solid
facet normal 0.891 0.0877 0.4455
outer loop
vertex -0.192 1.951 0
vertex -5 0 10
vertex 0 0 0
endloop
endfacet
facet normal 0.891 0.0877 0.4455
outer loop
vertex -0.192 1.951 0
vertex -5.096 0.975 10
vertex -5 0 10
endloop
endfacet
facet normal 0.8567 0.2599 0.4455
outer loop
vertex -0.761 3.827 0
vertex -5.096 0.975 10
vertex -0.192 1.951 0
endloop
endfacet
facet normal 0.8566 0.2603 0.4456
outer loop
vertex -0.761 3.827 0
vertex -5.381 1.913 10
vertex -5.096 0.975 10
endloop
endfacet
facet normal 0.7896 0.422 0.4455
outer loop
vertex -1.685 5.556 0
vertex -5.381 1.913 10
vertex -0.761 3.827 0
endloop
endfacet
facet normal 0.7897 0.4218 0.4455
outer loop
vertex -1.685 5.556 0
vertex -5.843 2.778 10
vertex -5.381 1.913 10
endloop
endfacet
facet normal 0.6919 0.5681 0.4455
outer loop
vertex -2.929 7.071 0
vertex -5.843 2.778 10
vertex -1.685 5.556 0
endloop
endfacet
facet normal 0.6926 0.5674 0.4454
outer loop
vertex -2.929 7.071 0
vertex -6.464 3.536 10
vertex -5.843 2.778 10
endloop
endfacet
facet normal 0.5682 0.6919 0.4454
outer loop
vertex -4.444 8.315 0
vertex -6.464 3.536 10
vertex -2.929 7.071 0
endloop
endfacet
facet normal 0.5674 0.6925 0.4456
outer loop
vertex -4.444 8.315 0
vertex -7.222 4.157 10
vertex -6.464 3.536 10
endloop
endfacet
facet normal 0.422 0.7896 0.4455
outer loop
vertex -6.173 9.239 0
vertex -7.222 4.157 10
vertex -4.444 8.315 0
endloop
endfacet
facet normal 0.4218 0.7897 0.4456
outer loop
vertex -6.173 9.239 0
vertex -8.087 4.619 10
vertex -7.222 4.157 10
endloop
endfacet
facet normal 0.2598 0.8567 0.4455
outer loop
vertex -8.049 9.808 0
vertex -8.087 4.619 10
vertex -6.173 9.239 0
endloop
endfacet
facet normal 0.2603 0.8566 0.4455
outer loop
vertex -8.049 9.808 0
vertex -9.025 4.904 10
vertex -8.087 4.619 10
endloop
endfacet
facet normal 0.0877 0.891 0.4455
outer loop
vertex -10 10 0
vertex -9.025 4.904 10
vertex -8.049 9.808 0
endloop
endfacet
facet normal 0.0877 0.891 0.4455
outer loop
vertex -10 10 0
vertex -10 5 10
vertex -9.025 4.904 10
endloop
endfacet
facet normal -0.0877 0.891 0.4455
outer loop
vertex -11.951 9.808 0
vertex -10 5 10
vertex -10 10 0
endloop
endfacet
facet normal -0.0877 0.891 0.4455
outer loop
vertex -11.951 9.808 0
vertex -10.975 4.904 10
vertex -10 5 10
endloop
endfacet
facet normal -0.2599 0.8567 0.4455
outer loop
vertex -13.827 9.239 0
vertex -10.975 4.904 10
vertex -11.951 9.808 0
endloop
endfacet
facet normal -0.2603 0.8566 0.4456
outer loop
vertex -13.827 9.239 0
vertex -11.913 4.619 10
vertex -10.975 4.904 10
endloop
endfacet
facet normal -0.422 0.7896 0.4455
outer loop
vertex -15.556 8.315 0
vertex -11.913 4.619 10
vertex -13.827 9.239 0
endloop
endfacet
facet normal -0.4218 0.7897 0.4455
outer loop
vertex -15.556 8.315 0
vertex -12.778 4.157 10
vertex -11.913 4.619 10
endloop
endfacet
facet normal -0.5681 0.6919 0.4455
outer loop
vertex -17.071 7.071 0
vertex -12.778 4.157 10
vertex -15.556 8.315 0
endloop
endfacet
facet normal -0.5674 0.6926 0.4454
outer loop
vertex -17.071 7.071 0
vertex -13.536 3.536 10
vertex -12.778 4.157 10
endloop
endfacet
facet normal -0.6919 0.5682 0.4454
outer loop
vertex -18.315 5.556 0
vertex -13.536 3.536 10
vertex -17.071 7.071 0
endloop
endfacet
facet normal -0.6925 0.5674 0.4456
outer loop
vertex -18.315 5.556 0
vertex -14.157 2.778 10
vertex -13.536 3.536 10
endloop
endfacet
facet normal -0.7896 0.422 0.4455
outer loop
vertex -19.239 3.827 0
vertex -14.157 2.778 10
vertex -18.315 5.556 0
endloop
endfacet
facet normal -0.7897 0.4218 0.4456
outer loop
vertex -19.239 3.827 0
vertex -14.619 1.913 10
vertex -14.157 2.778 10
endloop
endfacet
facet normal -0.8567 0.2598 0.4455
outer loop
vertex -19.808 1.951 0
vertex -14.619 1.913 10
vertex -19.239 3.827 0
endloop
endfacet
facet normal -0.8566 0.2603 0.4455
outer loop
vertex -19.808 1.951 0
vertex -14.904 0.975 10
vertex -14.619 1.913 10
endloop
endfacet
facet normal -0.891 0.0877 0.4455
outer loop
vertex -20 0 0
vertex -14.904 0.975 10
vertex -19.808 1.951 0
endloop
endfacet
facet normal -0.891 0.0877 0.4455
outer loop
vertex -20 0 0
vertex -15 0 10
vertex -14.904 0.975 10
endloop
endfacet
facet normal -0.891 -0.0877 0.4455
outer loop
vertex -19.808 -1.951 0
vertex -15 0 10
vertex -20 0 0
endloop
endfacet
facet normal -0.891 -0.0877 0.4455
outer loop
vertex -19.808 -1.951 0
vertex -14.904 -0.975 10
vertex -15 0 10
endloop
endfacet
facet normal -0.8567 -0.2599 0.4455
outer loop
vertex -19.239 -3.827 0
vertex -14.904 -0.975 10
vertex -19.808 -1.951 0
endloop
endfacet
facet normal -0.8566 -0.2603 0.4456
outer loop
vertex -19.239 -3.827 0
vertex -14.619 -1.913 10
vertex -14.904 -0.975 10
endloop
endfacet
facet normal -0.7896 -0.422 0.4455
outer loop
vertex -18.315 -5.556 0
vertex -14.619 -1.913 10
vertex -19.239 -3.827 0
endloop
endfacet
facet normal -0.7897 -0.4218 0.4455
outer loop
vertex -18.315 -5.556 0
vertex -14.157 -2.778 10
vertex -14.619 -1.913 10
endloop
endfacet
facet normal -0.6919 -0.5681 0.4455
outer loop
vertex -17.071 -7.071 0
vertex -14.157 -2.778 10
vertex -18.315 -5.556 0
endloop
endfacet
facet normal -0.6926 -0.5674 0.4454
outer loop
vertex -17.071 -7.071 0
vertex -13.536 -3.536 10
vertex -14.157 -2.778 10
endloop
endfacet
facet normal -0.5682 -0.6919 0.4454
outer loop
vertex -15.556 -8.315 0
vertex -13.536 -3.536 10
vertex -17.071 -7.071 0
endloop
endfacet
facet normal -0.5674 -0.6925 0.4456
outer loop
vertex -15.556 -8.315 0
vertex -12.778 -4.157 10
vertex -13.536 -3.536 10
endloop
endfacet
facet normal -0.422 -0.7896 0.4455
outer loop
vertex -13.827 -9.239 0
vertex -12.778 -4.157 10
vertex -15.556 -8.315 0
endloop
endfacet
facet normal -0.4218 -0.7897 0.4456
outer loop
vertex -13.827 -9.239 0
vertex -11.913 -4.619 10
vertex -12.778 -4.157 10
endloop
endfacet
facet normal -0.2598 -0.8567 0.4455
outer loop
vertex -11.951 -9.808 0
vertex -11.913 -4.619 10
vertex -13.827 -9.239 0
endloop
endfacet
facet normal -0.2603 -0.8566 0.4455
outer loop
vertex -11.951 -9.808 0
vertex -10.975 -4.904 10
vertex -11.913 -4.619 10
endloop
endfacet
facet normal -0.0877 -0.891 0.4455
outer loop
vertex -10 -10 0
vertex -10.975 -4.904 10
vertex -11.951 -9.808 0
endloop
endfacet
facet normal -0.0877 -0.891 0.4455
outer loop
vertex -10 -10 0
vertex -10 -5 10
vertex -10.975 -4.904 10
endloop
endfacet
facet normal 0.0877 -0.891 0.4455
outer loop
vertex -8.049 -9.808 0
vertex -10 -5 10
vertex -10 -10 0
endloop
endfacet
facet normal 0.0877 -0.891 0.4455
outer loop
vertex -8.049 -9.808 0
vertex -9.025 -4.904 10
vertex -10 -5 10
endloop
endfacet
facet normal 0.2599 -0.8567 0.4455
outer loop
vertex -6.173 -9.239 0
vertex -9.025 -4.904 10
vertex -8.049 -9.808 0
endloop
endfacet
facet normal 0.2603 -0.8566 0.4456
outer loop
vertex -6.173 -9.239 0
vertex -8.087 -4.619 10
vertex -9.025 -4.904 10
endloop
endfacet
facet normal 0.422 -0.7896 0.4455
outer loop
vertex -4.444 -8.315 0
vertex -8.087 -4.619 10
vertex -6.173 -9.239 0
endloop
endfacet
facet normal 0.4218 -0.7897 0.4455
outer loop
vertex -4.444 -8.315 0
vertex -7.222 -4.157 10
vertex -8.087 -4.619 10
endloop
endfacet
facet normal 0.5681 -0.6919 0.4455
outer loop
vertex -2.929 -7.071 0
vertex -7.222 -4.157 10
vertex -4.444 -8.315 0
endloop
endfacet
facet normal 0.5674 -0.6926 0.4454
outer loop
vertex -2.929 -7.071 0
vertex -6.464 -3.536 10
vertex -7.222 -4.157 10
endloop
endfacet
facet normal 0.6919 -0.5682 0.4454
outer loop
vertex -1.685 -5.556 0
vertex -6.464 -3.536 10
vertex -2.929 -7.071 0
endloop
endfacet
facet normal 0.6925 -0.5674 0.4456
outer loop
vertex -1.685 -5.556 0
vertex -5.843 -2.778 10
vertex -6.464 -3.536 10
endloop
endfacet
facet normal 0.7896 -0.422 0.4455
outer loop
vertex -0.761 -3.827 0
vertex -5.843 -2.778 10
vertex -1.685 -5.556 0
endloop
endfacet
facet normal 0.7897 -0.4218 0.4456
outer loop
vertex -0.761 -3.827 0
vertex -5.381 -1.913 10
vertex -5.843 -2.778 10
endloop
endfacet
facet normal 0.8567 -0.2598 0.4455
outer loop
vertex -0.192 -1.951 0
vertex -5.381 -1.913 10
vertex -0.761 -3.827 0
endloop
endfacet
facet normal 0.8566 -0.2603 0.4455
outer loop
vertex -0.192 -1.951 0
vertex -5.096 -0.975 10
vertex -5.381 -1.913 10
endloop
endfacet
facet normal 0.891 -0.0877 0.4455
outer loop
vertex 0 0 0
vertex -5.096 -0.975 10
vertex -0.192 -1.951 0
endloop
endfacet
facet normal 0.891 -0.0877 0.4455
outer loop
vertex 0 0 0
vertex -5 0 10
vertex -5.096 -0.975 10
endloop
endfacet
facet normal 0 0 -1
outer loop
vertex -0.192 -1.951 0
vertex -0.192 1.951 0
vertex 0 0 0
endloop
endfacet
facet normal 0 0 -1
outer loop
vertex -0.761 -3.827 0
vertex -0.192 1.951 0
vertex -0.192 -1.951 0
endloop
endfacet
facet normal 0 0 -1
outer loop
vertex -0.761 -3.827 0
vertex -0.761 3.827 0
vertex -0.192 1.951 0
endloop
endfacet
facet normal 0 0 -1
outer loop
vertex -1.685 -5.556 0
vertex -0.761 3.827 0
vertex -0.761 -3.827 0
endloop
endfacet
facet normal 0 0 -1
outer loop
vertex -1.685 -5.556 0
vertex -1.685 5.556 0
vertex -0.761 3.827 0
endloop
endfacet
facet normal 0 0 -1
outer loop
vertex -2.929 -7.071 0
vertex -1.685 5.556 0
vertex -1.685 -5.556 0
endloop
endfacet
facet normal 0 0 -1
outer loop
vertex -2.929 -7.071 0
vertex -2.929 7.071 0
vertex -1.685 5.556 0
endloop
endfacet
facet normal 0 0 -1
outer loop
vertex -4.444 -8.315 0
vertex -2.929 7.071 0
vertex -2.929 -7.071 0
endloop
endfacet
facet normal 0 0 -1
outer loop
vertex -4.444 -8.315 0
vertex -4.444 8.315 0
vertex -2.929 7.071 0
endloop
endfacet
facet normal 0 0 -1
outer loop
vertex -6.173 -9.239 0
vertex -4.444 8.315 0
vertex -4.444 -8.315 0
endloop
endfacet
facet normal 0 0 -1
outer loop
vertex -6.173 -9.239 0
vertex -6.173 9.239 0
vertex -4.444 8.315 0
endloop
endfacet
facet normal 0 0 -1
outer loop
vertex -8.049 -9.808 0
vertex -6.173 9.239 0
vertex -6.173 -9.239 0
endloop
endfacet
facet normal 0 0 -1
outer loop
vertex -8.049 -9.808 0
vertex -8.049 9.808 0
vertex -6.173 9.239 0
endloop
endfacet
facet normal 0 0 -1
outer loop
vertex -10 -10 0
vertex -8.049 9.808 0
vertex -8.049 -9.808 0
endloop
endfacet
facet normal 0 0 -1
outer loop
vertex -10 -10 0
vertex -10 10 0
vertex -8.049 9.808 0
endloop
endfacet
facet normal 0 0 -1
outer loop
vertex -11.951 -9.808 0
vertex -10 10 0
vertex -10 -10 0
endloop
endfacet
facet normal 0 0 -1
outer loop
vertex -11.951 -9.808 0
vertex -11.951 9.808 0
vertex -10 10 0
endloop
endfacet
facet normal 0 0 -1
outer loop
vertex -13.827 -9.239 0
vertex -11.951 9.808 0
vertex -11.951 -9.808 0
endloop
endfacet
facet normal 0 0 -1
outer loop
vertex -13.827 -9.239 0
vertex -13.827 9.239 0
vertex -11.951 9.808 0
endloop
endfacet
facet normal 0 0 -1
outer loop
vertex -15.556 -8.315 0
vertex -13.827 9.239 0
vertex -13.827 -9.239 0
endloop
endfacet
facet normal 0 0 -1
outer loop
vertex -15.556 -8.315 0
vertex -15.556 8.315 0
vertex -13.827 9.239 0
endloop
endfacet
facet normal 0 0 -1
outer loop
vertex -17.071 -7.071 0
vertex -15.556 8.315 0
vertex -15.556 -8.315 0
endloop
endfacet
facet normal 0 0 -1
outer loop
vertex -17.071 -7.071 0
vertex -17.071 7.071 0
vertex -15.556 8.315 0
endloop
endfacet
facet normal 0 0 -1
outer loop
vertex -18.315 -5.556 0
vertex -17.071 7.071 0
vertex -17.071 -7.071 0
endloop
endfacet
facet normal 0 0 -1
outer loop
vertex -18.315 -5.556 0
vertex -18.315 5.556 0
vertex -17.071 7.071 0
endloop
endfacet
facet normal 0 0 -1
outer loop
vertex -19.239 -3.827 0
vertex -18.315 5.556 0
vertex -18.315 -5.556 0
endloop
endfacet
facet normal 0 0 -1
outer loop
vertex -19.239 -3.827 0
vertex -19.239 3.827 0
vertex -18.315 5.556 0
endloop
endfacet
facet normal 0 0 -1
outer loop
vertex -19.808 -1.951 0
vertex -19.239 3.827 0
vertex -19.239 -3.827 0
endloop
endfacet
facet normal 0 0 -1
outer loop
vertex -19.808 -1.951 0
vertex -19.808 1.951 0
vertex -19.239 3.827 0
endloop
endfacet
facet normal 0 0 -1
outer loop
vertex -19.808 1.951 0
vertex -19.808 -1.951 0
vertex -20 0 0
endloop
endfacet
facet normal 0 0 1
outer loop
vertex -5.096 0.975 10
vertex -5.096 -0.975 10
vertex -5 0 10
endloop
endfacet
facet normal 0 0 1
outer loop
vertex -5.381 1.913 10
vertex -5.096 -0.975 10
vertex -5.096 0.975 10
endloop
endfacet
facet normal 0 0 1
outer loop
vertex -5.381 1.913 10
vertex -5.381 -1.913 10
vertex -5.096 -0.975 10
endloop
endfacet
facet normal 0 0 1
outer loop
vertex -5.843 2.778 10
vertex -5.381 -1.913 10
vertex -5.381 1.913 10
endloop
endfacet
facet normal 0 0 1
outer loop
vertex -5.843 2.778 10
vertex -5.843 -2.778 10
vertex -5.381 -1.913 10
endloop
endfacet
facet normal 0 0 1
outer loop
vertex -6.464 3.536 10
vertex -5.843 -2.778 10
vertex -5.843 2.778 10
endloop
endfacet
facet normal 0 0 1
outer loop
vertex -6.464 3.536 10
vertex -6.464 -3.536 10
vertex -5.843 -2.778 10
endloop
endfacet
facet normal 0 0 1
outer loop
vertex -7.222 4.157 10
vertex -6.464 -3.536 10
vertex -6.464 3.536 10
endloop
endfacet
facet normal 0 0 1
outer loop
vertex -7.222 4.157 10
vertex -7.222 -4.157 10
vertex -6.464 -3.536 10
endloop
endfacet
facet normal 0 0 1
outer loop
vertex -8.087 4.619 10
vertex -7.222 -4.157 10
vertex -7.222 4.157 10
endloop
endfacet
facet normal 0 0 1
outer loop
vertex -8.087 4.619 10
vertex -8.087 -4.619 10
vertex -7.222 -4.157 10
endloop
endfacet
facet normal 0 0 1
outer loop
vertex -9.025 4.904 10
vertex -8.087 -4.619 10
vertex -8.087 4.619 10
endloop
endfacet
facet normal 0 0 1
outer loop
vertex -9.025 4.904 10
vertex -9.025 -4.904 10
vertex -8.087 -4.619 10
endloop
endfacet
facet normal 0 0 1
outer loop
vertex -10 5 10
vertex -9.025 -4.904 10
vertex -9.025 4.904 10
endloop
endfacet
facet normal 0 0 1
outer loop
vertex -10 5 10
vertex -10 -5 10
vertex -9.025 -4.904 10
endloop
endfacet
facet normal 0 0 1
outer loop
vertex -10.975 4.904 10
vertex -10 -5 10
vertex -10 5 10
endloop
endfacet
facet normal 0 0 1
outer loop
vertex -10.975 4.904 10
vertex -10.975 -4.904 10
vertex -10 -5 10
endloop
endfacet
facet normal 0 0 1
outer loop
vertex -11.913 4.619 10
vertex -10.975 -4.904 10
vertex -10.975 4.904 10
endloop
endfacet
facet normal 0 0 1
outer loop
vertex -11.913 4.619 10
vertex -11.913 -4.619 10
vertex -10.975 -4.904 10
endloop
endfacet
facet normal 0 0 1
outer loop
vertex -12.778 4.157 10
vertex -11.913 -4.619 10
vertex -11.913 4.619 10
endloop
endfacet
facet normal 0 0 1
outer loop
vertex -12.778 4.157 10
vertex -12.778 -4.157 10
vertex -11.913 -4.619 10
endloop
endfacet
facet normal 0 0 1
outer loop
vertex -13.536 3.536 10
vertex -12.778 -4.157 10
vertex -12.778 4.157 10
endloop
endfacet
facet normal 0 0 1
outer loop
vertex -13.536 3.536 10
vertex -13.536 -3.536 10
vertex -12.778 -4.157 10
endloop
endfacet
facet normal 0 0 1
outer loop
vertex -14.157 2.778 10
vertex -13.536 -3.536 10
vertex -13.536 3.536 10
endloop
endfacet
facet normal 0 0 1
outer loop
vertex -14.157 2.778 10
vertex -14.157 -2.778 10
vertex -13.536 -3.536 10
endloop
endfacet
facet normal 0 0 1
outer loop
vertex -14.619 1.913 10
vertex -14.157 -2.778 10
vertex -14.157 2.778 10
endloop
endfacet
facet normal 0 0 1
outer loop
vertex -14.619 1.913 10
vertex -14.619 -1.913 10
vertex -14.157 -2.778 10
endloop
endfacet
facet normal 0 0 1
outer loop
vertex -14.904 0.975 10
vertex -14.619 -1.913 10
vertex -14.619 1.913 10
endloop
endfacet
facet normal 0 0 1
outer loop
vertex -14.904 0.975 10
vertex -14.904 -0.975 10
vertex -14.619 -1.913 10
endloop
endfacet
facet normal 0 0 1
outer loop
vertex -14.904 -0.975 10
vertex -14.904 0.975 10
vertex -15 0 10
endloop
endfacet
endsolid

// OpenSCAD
// Auther: Tobias Grundtvig
// Date: Oct 1, 2020
//
// A cone, wraps the build-in cylinder module, to get consistent naming

Cone(bottom_diameter=20, top_diameter=10, height=10, t_x="neg", t_z="pos");

module Cone(bottom_diameter,
            top_diameter,
            height,
            t_x="center",
            t_y="center",
            t_z="center",
            angular_resolution=32)
{
    max_d = max(bottom_diameter, top_diameter);
    tx = t_x == "neg" ? -max_d/2 : 
            t_x == "pos" ? max_d/2 : 0;
    ty = t_y == "neg" ? -max_d/2 : 
            t_y == "pos" ? max_d/2 : 0;
    tz = t_z == "neg" ? -height/2 : 
            t_z == "pos" ? height/2 : 0;
    translate([tx,ty,tz])
    cylinder(d1=bottom_diameter, d2=top_diameter, h=height, center=true, $fn=angular_resolution);
}
